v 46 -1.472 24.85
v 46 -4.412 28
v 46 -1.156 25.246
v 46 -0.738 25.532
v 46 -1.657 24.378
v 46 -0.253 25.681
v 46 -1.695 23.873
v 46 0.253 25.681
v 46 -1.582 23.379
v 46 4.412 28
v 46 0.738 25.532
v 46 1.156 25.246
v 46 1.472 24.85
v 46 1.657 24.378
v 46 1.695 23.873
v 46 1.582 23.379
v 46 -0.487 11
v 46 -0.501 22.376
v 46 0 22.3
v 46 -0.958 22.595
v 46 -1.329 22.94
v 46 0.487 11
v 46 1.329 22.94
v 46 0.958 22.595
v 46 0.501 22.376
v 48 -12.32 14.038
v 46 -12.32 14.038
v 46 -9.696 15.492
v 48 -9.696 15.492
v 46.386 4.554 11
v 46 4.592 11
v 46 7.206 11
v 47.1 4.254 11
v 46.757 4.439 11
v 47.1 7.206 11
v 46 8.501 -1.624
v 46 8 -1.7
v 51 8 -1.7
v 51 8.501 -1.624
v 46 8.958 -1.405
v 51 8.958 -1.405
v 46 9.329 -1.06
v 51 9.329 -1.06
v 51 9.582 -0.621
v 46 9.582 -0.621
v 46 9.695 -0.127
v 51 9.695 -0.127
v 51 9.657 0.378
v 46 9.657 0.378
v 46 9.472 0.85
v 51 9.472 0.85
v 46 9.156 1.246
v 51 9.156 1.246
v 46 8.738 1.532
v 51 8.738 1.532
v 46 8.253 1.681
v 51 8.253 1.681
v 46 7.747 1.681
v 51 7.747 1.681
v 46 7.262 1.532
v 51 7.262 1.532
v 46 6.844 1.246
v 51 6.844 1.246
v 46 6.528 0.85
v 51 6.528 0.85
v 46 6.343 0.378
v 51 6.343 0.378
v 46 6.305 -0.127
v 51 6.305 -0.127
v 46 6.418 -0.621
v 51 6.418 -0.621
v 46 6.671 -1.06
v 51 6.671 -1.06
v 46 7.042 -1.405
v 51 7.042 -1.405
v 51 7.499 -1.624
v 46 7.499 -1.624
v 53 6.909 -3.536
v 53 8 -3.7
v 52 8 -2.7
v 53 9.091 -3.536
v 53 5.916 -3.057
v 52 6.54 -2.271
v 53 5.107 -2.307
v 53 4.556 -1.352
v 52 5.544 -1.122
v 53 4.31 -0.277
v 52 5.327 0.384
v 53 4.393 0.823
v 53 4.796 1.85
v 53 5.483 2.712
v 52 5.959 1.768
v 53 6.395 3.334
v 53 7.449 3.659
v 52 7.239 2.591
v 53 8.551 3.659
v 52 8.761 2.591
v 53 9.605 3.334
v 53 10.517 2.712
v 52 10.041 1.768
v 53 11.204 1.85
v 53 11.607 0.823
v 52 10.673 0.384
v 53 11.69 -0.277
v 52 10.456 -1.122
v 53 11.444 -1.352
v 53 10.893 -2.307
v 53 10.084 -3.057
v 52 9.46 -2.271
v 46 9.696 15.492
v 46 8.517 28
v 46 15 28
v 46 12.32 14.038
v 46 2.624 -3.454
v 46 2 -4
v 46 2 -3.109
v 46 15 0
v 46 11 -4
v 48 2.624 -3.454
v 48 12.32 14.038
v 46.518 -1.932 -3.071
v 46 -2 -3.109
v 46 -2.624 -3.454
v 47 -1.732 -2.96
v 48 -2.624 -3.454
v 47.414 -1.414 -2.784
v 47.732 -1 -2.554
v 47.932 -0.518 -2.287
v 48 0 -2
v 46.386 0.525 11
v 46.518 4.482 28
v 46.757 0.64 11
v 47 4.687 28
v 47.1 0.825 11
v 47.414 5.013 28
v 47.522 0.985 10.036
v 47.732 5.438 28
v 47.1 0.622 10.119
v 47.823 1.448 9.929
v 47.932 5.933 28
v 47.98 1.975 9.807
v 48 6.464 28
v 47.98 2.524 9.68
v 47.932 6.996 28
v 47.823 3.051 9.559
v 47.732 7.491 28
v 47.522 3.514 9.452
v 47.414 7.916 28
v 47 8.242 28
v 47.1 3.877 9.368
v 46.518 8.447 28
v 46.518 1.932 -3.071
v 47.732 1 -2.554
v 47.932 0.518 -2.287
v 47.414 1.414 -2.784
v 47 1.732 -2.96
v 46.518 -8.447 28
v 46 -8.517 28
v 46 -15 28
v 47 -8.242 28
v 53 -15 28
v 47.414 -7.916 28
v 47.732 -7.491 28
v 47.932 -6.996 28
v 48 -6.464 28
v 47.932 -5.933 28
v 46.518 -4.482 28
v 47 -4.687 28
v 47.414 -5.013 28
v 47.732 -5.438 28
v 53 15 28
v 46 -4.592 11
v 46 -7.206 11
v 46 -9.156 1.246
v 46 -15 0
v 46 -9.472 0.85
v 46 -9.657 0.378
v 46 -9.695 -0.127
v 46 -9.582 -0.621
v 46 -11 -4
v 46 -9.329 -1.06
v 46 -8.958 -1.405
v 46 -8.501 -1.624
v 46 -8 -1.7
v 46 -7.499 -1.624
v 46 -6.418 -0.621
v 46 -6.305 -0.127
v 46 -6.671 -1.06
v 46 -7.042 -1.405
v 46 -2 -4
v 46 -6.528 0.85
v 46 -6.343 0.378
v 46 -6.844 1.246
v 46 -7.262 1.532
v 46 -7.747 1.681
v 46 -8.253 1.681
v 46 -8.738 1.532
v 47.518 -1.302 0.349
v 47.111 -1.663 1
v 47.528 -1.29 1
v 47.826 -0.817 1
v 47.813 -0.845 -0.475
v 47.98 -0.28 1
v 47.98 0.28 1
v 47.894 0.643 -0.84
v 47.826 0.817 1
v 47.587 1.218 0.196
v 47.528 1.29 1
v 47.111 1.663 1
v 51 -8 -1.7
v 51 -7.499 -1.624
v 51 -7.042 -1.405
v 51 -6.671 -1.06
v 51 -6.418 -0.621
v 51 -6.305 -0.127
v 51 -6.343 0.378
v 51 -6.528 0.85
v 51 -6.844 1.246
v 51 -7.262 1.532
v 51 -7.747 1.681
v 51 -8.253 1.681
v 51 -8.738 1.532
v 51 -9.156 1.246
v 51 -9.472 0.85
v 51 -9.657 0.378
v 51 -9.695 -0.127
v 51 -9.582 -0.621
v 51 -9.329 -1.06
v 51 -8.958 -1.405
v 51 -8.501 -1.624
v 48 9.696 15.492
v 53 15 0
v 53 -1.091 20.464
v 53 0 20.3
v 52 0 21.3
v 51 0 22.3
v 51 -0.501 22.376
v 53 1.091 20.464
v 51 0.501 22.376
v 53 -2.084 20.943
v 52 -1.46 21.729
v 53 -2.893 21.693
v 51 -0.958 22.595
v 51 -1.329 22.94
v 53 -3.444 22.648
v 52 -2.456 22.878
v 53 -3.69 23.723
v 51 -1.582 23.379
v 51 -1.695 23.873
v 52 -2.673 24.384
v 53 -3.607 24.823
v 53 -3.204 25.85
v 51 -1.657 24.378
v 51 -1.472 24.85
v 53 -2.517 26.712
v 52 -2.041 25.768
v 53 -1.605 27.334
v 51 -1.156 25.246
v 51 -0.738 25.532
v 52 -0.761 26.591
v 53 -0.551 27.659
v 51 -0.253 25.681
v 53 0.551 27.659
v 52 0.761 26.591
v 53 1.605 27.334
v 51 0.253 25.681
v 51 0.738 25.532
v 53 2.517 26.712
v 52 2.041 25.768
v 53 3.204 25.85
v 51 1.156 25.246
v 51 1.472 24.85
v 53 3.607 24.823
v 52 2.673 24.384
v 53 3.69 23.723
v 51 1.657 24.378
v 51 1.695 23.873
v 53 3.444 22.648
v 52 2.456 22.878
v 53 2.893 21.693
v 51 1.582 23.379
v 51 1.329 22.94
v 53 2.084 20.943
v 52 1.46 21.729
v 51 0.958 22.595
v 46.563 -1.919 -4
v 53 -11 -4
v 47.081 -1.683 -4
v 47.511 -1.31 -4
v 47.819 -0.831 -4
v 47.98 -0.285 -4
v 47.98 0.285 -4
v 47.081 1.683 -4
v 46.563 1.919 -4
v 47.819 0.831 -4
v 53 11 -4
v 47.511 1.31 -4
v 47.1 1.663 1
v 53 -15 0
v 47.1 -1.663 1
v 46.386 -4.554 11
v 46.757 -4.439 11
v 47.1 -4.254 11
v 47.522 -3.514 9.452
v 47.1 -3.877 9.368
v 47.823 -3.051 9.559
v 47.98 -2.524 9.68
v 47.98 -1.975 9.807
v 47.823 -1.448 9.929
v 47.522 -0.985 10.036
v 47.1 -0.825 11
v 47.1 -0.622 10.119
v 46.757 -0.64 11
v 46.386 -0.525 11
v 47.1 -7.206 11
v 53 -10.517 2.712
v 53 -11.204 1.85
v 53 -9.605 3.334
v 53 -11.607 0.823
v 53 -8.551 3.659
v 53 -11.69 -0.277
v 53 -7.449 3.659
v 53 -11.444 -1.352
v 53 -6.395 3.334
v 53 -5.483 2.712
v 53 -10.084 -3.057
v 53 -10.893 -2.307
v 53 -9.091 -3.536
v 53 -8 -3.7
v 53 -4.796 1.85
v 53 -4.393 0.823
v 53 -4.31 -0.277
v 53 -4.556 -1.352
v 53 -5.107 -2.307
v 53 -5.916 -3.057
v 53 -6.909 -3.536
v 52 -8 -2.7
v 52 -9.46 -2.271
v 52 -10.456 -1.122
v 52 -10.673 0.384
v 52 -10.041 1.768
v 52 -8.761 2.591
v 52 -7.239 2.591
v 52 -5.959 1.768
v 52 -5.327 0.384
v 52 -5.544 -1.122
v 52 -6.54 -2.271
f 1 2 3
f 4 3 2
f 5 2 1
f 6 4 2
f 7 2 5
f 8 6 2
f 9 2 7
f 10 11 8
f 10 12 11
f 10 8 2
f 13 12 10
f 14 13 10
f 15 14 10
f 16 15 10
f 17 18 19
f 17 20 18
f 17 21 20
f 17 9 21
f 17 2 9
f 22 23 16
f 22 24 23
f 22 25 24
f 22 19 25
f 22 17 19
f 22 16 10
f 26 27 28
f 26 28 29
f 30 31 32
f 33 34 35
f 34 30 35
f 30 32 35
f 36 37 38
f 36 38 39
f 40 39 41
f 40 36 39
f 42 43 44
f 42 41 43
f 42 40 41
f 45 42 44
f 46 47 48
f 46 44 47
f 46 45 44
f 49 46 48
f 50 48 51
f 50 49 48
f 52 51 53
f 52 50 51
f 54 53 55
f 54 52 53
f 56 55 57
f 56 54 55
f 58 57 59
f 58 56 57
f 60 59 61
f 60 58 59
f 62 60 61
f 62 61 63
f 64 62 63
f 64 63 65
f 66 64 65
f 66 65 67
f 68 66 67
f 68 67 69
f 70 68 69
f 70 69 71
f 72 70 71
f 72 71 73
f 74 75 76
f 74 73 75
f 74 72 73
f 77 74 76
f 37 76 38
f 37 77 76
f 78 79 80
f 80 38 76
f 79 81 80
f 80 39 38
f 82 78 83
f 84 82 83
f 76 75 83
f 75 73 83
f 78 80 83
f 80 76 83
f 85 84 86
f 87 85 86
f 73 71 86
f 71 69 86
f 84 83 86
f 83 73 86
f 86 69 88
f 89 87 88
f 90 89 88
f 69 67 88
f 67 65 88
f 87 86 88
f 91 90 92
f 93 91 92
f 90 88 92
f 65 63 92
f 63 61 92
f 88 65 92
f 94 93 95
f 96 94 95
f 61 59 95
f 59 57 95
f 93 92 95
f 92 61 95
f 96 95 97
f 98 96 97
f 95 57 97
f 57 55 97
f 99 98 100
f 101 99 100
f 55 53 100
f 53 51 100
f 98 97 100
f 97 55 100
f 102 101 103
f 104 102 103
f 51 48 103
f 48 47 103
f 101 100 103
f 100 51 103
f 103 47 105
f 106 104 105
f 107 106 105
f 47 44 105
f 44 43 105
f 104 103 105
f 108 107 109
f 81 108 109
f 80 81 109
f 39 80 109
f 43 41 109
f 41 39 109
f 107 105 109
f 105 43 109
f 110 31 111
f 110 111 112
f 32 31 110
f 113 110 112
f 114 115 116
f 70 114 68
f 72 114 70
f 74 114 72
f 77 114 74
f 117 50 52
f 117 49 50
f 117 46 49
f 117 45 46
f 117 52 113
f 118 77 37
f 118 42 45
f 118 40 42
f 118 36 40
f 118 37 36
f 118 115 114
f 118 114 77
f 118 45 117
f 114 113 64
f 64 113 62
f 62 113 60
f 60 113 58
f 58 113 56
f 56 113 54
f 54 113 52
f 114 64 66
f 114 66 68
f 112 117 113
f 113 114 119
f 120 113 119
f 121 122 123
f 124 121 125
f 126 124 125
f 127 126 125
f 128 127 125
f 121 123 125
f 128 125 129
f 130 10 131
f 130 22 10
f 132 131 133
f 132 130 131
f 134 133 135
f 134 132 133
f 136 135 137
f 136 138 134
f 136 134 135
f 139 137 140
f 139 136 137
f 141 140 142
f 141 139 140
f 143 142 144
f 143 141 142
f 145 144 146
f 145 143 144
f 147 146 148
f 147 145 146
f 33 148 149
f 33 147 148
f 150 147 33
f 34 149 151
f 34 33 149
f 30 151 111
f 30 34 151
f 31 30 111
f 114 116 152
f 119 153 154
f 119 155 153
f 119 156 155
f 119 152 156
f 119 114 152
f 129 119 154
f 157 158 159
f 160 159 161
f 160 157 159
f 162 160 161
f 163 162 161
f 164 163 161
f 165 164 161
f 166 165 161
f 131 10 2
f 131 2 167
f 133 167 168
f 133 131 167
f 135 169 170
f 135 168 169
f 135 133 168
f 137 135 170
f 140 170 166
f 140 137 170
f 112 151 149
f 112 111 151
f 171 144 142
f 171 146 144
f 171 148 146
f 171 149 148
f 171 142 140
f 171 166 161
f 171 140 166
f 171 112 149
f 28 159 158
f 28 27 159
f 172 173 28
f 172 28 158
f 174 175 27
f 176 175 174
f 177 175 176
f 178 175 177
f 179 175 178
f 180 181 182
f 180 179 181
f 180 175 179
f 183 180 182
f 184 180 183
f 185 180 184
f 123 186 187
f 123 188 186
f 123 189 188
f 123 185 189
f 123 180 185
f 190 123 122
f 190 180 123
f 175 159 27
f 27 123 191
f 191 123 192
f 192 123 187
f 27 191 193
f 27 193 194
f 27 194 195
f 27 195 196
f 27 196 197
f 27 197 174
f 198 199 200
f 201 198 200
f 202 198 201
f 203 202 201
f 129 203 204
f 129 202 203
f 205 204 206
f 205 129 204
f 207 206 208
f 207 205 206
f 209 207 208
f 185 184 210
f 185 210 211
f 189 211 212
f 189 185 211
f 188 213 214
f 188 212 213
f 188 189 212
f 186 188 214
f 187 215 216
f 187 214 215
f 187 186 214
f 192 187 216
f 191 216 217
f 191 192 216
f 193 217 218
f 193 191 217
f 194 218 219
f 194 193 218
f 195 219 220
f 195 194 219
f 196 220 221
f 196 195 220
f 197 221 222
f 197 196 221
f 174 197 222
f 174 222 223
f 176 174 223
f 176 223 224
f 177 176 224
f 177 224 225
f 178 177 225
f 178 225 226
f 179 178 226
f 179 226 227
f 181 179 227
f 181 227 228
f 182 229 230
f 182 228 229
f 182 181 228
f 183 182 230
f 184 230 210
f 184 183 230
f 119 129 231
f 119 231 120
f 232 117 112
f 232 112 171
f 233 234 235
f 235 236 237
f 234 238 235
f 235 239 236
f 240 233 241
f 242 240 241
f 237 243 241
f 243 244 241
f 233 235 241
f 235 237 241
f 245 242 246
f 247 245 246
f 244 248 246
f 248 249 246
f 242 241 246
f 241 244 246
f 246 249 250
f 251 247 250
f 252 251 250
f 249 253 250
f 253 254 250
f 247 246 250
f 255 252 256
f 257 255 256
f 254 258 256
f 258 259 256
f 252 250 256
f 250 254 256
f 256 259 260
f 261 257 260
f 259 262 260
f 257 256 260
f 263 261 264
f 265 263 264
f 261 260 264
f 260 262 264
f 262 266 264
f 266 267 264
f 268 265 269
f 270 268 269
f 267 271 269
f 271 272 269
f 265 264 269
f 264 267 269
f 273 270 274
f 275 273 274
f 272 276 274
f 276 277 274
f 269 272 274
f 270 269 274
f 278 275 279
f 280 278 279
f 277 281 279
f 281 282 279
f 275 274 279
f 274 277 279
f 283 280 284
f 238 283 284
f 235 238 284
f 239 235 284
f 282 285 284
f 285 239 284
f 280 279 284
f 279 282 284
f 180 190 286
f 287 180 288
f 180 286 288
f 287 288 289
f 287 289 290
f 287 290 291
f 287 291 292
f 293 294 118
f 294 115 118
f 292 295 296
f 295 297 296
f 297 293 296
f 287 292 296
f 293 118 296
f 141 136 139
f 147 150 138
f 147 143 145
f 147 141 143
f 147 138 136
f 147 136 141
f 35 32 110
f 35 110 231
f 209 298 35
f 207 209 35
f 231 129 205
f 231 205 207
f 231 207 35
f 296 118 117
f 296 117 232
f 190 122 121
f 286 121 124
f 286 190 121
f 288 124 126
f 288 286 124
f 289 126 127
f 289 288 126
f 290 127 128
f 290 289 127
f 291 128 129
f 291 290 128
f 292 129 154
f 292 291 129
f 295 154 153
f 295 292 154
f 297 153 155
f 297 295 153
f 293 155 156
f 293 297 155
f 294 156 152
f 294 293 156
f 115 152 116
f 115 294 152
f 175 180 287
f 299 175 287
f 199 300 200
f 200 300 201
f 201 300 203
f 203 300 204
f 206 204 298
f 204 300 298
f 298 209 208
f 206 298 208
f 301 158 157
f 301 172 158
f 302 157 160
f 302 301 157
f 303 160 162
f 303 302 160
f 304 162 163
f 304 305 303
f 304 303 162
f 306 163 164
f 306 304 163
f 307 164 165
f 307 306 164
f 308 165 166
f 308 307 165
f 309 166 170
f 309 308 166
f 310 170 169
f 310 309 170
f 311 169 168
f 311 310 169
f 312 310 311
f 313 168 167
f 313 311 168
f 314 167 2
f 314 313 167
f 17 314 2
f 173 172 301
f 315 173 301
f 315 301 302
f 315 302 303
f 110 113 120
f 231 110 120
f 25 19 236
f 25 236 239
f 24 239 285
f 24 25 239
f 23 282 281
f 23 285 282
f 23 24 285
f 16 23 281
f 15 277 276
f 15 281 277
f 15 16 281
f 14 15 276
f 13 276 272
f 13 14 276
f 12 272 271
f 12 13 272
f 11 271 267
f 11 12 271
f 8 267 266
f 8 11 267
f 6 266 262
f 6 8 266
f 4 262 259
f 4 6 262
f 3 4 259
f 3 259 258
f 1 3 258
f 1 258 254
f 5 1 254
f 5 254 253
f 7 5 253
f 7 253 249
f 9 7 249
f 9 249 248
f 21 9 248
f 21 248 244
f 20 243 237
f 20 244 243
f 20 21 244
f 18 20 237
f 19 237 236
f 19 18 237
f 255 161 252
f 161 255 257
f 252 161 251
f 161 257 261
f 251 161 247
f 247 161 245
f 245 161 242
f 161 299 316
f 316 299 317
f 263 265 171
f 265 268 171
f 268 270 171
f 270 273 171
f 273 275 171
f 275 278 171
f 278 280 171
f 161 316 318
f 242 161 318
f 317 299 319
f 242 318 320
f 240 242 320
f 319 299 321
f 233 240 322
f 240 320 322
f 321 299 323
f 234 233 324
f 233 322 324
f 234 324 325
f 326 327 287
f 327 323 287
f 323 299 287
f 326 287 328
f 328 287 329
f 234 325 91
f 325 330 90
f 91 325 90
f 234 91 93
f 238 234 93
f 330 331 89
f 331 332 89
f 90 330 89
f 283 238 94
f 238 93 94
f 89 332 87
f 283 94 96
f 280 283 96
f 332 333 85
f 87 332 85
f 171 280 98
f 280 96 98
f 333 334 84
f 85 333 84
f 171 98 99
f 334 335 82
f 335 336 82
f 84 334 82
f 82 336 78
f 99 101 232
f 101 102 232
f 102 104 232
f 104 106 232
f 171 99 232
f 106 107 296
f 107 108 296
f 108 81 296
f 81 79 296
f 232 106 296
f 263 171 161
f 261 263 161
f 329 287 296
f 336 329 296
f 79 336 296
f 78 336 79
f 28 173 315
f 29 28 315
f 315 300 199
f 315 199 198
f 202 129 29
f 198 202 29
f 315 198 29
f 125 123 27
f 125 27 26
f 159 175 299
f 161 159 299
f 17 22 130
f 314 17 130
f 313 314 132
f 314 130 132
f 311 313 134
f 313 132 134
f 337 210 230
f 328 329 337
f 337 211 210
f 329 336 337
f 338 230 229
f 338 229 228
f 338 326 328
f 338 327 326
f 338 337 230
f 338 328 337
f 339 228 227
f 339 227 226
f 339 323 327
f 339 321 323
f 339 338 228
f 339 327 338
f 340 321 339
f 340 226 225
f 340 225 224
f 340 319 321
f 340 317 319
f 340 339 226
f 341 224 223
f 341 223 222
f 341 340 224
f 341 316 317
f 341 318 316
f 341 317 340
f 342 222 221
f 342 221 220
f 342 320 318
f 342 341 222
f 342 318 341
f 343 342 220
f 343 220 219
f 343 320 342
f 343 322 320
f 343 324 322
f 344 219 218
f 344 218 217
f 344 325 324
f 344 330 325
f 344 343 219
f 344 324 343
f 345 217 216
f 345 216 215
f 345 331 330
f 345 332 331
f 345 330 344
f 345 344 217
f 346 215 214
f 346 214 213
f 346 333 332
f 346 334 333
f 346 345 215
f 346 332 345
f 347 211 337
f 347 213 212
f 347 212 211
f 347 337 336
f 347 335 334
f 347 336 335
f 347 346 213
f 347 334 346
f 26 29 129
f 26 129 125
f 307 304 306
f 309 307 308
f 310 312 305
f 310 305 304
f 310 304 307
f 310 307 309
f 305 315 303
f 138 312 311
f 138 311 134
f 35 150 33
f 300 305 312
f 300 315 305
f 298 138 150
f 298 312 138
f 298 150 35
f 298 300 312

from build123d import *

# Parameters (mm, degrees)
BOX001027045148_W          = 4
BOX001027045148_H          = 3
BOX001027045148_DEPTH      = 20
BOX001027045148_ROLL_ANGLE = -29
BOX001027045147_W          = 4
BOX001027045147_H          = 3
BOX001027045147_DEPTH      = 20
BOX001027045147_ROLL_ANGLE = -29
CYLINDER203_R              = 1.7
CYLINDER203_DEPTH          = 30
CYLINDER203_PITCH_ANGLE    = 90
CYLINDER204_R              = 1.7
CYLINDER204_DEPTH          = 30
CYLINDER204_PITCH_ANGLE    = 90
CYLINDER202_R              = 1.7
CYLINDER202_DEPTH          = 30
CYLINDER202_PITCH_ANGLE    = 90
CYLINDER210_R              = 2
CYLINDER210_DEPTH          = 30
CYLINDER210_ROLL_ANGLE     = 13
CYLINDER209_R              = 2
CYLINDER209_DEPTH          = 30
CYLINDER209_ROLL_ANGLE     = -13
CYLINDER211_R              = 2
CYLINDER211_DEPTH          = 20
BOX001027045145_W          = 2.2
BOX001027045145_H          = 16
BOX001027045145_DEPTH      = 11
CHAMFER010_SIZE            = 7
CHAMFER011_SIZE            = 3
BOX001027045140_W          = 7
BOX001027045140_H          = 30
BOX001027045140_DEPTH      = 32
CHAMFER004_SIZE            = 4
CHAMFER012_SIZE            = 2


with BuildPart() as cube199:
    # Box001027045148 → Box001027045148 (new body)
    with BuildSketch(Plane.XY):
        with Locations((2, 1.5)):
            Rectangle(BOX001027045148_W, BOX001027045148_H)
    extrude(amount=BOX001027045148_DEPTH)


with BuildPart() as cube199_1:
    # Box001027045148 roll: moved
    add(cube199.part.rotate(Axis((0, 0, 0), (1, 0, 0)), BOX001027045148_ROLL_ANGLE))


with BuildPart() as cube199_2:
    # Box001027045148 placement: moved
    add(cube199_1.part.moved(Location((-2, 0, -2))))


with BuildPart() as part_mirroring002:
    # Part__Mirroring002: instance of Cube199
    add(cube199_2.part.mirror(Plane(origin=(0, 0, 0), x_dir=(1, 0, 0), z_dir=(0, 1, 0))))


with BuildPart() as split_holders001:
    # Box001027045147 → Box001027045147 (new body)
    with BuildSketch(Plane.XY):
        with Locations((2, 1.5)):
            Rectangle(BOX001027045147_W, BOX001027045147_H)
    extrude(amount=BOX001027045147_DEPTH)


with BuildPart() as split_holders001_1:
    # Box001027045147 roll: moved
    add(split_holders001.part.rotate(Axis((0, 0, 0), (1, 0, 0)), BOX001027045147_ROLL_ANGLE))


with BuildPart() as split_holders001_2:
    # Box001027045147 placement: moved
    add(split_holders001_1.part.moved(Location((-2, 0, -2))))

    # Fusion112099: union Part__Mirroring002
    add(part_mirroring002.part)


with BuildPart() as m3_clear_a:
    # Cylinder203 → Cylinder203 (new body)
    with BuildSketch(Plane.XY):
        Circle(CYLINDER203_R)
    extrude(amount=CYLINDER203_DEPTH)


with BuildPart() as m3_clear_a_1:
    # Cylinder203 pitch: moved
    add(m3_clear_a.part.rotate(Axis((0, 0, 0), (0, 1, 0)), CYLINDER203_PITCH_ANGLE))


with BuildPart() as m3_clear_a_2:
    # Cylinder203 placement: moved
    add(m3_clear_a_1.part.moved(Location((-15, 8, 0))))


with BuildPart() as m3_clear_b:
    # Cylinder204 → Cylinder204 (new body)
    with BuildSketch(Plane.XY):
        Circle(CYLINDER204_R)
    extrude(amount=CYLINDER204_DEPTH)


with BuildPart() as m3_clear_b_1:
    # Cylinder204 pitch: moved
    add(m3_clear_b.part.rotate(Axis((0, 0, 0), (0, 1, 0)), CYLINDER204_PITCH_ANGLE))


with BuildPart() as m3_clear_b_2:
    # Cylinder204 placement: moved
    add(m3_clear_b_1.part.moved(Location((-15, -8, 0))))


with BuildPart() as m3_clears:
    # Cylinder202 → Cylinder202 (new body)
    with BuildSketch(Plane.XY):
        Circle(CYLINDER202_R)
    extrude(amount=CYLINDER202_DEPTH)


with BuildPart() as m3_clears_1:
    # Cylinder202 pitch: moved
    add(m3_clears.part.rotate(Axis((0, 0, 0), (0, 1, 0)), CYLINDER202_PITCH_ANGLE))


with BuildPart() as m3_clears_2:
    # Cylinder202 placement: moved
    add(m3_clears_1.part.moved(Location((-15, 0, 24))))

    # Fusion112083: union M3-clear-a, M3-clear-b
    add(m3_clear_a_2.part)
    add(m3_clear_b_2.part)


with BuildPart() as cylinder210:
    # Cylinder210 → Cylinder210 (new body)
    with BuildSketch(Plane.XY):
        Circle(CYLINDER210_R)
    extrude(amount=CYLINDER210_DEPTH)


with BuildPart() as cylinder210_1:
    # Cylinder210 roll: moved
    add(cylinder210.part.rotate(Axis((0, 0, 0), (1, 0, 0)), CYLINDER210_ROLL_ANGLE))


with BuildPart() as cylinder210_2:
    # Cylinder210 placement: moved
    add(cylinder210_1.part.moved(Location((0, -2.249511, 9.743701))))


with BuildPart() as cylinder209:
    # Cylinder209 → Cylinder209 (new body)
    with BuildSketch(Plane.XY):
        Circle(CYLINDER209_R)
    extrude(amount=CYLINDER209_DEPTH)


with BuildPart() as cylinder209_1:
    # Cylinder209 roll: moved
    add(cylinder209.part.rotate(Axis((0, 0, 0), (1, 0, 0)), CYLINDER209_ROLL_ANGLE))


with BuildPart() as cylinder209_2:
    # Cylinder209 placement: moved
    add(cylinder209_1.part.moved(Location((0, 2.249511, 9.743701))))


with BuildPart() as cylinder243:
    # Cylinder211 → Cylinder211 (new body)
    with BuildSketch(Plane.XY.offset(-19)):
        Circle(CYLINDER211_R)
    extrude(amount=CYLINDER211_DEPTH)


with BuildPart() as y_top_m3:
    # Box001027045145 → Box001027045145 (new body)
    with BuildSketch(Plane(origin=(-1.1, -8, 0), x_dir=(1, 0, 0), z_dir=(0, 0, 1))):
        with Locations((1.1, 8)):
            Rectangle(BOX001027045145_W, BOX001027045145_H)
    extrude(amount=BOX001027045145_DEPTH)

    # Chamfer010
    chamfer010_edges = [y_top_m3.edges().sort_by_distance(p)[0] for p in [
        (0, -8, 0),
        (0, 8, 0),
    ]]
    chamfer(chamfer010_edges, length=CHAMFER010_SIZE)

    # Chamfer011
    chamfer011_edges = [y_top_m3.edges().sort_by_distance(p)[0] for p in [
        (0, -8, 7),
        (0, 8, 7),
    ]]
    chamfer(chamfer011_edges, length=CHAMFER011_SIZE)

    # Fusion112094: union Cylinder210, Cylinder209, Cylinder243
    add(cylinder210_2.part)
    add(cylinder209_2.part)
    add(cylinder243.part)

    # Fusion112100: union M3-clears
    add(m3_clears_2.part)


with BuildPart() as top:
    # Box001027045140 → Box001027045140 (new body)
    with BuildSketch(Plane(origin=(0, -15, -4), x_dir=(1, 0, 0), z_dir=(0, 0, 1))):
        with Locations((3.5, 15)):
            Rectangle(BOX001027045140_W, BOX001027045140_H)
    extrude(amount=BOX001027045140_DEPTH)

    # Chamfer004
    chamfer004_edges = [top.edges().sort_by_distance(p)[0] for p in [
        (3.5, -15, -4),
        (3.5, 15, -4),
    ]]
    chamfer(chamfer004_edges, length=CHAMFER004_SIZE)

    # Cut162: cut y-top-M3
    add(y_top_m3.part, mode=Mode.SUBTRACT)

    # Cut163: cut split-holders001
    add(split_holders001_2.part, mode=Mode.SUBTRACT)

    # Chamfer012
    chamfer012_edges = [top.edges().sort_by_distance(p)[0] for p in [
        (7, -8, 1.7),
        (7, 0, 25.7),
        (7, 8, 1.7),
    ]]
    chamfer(chamfer012_edges, length=CHAMFER012_SIZE)


with BuildPart() as top_1:
    # Chamfer012 placement: moved
    add(top.part.moved(Location((46, 0, 0))))


solid = top_1.part
